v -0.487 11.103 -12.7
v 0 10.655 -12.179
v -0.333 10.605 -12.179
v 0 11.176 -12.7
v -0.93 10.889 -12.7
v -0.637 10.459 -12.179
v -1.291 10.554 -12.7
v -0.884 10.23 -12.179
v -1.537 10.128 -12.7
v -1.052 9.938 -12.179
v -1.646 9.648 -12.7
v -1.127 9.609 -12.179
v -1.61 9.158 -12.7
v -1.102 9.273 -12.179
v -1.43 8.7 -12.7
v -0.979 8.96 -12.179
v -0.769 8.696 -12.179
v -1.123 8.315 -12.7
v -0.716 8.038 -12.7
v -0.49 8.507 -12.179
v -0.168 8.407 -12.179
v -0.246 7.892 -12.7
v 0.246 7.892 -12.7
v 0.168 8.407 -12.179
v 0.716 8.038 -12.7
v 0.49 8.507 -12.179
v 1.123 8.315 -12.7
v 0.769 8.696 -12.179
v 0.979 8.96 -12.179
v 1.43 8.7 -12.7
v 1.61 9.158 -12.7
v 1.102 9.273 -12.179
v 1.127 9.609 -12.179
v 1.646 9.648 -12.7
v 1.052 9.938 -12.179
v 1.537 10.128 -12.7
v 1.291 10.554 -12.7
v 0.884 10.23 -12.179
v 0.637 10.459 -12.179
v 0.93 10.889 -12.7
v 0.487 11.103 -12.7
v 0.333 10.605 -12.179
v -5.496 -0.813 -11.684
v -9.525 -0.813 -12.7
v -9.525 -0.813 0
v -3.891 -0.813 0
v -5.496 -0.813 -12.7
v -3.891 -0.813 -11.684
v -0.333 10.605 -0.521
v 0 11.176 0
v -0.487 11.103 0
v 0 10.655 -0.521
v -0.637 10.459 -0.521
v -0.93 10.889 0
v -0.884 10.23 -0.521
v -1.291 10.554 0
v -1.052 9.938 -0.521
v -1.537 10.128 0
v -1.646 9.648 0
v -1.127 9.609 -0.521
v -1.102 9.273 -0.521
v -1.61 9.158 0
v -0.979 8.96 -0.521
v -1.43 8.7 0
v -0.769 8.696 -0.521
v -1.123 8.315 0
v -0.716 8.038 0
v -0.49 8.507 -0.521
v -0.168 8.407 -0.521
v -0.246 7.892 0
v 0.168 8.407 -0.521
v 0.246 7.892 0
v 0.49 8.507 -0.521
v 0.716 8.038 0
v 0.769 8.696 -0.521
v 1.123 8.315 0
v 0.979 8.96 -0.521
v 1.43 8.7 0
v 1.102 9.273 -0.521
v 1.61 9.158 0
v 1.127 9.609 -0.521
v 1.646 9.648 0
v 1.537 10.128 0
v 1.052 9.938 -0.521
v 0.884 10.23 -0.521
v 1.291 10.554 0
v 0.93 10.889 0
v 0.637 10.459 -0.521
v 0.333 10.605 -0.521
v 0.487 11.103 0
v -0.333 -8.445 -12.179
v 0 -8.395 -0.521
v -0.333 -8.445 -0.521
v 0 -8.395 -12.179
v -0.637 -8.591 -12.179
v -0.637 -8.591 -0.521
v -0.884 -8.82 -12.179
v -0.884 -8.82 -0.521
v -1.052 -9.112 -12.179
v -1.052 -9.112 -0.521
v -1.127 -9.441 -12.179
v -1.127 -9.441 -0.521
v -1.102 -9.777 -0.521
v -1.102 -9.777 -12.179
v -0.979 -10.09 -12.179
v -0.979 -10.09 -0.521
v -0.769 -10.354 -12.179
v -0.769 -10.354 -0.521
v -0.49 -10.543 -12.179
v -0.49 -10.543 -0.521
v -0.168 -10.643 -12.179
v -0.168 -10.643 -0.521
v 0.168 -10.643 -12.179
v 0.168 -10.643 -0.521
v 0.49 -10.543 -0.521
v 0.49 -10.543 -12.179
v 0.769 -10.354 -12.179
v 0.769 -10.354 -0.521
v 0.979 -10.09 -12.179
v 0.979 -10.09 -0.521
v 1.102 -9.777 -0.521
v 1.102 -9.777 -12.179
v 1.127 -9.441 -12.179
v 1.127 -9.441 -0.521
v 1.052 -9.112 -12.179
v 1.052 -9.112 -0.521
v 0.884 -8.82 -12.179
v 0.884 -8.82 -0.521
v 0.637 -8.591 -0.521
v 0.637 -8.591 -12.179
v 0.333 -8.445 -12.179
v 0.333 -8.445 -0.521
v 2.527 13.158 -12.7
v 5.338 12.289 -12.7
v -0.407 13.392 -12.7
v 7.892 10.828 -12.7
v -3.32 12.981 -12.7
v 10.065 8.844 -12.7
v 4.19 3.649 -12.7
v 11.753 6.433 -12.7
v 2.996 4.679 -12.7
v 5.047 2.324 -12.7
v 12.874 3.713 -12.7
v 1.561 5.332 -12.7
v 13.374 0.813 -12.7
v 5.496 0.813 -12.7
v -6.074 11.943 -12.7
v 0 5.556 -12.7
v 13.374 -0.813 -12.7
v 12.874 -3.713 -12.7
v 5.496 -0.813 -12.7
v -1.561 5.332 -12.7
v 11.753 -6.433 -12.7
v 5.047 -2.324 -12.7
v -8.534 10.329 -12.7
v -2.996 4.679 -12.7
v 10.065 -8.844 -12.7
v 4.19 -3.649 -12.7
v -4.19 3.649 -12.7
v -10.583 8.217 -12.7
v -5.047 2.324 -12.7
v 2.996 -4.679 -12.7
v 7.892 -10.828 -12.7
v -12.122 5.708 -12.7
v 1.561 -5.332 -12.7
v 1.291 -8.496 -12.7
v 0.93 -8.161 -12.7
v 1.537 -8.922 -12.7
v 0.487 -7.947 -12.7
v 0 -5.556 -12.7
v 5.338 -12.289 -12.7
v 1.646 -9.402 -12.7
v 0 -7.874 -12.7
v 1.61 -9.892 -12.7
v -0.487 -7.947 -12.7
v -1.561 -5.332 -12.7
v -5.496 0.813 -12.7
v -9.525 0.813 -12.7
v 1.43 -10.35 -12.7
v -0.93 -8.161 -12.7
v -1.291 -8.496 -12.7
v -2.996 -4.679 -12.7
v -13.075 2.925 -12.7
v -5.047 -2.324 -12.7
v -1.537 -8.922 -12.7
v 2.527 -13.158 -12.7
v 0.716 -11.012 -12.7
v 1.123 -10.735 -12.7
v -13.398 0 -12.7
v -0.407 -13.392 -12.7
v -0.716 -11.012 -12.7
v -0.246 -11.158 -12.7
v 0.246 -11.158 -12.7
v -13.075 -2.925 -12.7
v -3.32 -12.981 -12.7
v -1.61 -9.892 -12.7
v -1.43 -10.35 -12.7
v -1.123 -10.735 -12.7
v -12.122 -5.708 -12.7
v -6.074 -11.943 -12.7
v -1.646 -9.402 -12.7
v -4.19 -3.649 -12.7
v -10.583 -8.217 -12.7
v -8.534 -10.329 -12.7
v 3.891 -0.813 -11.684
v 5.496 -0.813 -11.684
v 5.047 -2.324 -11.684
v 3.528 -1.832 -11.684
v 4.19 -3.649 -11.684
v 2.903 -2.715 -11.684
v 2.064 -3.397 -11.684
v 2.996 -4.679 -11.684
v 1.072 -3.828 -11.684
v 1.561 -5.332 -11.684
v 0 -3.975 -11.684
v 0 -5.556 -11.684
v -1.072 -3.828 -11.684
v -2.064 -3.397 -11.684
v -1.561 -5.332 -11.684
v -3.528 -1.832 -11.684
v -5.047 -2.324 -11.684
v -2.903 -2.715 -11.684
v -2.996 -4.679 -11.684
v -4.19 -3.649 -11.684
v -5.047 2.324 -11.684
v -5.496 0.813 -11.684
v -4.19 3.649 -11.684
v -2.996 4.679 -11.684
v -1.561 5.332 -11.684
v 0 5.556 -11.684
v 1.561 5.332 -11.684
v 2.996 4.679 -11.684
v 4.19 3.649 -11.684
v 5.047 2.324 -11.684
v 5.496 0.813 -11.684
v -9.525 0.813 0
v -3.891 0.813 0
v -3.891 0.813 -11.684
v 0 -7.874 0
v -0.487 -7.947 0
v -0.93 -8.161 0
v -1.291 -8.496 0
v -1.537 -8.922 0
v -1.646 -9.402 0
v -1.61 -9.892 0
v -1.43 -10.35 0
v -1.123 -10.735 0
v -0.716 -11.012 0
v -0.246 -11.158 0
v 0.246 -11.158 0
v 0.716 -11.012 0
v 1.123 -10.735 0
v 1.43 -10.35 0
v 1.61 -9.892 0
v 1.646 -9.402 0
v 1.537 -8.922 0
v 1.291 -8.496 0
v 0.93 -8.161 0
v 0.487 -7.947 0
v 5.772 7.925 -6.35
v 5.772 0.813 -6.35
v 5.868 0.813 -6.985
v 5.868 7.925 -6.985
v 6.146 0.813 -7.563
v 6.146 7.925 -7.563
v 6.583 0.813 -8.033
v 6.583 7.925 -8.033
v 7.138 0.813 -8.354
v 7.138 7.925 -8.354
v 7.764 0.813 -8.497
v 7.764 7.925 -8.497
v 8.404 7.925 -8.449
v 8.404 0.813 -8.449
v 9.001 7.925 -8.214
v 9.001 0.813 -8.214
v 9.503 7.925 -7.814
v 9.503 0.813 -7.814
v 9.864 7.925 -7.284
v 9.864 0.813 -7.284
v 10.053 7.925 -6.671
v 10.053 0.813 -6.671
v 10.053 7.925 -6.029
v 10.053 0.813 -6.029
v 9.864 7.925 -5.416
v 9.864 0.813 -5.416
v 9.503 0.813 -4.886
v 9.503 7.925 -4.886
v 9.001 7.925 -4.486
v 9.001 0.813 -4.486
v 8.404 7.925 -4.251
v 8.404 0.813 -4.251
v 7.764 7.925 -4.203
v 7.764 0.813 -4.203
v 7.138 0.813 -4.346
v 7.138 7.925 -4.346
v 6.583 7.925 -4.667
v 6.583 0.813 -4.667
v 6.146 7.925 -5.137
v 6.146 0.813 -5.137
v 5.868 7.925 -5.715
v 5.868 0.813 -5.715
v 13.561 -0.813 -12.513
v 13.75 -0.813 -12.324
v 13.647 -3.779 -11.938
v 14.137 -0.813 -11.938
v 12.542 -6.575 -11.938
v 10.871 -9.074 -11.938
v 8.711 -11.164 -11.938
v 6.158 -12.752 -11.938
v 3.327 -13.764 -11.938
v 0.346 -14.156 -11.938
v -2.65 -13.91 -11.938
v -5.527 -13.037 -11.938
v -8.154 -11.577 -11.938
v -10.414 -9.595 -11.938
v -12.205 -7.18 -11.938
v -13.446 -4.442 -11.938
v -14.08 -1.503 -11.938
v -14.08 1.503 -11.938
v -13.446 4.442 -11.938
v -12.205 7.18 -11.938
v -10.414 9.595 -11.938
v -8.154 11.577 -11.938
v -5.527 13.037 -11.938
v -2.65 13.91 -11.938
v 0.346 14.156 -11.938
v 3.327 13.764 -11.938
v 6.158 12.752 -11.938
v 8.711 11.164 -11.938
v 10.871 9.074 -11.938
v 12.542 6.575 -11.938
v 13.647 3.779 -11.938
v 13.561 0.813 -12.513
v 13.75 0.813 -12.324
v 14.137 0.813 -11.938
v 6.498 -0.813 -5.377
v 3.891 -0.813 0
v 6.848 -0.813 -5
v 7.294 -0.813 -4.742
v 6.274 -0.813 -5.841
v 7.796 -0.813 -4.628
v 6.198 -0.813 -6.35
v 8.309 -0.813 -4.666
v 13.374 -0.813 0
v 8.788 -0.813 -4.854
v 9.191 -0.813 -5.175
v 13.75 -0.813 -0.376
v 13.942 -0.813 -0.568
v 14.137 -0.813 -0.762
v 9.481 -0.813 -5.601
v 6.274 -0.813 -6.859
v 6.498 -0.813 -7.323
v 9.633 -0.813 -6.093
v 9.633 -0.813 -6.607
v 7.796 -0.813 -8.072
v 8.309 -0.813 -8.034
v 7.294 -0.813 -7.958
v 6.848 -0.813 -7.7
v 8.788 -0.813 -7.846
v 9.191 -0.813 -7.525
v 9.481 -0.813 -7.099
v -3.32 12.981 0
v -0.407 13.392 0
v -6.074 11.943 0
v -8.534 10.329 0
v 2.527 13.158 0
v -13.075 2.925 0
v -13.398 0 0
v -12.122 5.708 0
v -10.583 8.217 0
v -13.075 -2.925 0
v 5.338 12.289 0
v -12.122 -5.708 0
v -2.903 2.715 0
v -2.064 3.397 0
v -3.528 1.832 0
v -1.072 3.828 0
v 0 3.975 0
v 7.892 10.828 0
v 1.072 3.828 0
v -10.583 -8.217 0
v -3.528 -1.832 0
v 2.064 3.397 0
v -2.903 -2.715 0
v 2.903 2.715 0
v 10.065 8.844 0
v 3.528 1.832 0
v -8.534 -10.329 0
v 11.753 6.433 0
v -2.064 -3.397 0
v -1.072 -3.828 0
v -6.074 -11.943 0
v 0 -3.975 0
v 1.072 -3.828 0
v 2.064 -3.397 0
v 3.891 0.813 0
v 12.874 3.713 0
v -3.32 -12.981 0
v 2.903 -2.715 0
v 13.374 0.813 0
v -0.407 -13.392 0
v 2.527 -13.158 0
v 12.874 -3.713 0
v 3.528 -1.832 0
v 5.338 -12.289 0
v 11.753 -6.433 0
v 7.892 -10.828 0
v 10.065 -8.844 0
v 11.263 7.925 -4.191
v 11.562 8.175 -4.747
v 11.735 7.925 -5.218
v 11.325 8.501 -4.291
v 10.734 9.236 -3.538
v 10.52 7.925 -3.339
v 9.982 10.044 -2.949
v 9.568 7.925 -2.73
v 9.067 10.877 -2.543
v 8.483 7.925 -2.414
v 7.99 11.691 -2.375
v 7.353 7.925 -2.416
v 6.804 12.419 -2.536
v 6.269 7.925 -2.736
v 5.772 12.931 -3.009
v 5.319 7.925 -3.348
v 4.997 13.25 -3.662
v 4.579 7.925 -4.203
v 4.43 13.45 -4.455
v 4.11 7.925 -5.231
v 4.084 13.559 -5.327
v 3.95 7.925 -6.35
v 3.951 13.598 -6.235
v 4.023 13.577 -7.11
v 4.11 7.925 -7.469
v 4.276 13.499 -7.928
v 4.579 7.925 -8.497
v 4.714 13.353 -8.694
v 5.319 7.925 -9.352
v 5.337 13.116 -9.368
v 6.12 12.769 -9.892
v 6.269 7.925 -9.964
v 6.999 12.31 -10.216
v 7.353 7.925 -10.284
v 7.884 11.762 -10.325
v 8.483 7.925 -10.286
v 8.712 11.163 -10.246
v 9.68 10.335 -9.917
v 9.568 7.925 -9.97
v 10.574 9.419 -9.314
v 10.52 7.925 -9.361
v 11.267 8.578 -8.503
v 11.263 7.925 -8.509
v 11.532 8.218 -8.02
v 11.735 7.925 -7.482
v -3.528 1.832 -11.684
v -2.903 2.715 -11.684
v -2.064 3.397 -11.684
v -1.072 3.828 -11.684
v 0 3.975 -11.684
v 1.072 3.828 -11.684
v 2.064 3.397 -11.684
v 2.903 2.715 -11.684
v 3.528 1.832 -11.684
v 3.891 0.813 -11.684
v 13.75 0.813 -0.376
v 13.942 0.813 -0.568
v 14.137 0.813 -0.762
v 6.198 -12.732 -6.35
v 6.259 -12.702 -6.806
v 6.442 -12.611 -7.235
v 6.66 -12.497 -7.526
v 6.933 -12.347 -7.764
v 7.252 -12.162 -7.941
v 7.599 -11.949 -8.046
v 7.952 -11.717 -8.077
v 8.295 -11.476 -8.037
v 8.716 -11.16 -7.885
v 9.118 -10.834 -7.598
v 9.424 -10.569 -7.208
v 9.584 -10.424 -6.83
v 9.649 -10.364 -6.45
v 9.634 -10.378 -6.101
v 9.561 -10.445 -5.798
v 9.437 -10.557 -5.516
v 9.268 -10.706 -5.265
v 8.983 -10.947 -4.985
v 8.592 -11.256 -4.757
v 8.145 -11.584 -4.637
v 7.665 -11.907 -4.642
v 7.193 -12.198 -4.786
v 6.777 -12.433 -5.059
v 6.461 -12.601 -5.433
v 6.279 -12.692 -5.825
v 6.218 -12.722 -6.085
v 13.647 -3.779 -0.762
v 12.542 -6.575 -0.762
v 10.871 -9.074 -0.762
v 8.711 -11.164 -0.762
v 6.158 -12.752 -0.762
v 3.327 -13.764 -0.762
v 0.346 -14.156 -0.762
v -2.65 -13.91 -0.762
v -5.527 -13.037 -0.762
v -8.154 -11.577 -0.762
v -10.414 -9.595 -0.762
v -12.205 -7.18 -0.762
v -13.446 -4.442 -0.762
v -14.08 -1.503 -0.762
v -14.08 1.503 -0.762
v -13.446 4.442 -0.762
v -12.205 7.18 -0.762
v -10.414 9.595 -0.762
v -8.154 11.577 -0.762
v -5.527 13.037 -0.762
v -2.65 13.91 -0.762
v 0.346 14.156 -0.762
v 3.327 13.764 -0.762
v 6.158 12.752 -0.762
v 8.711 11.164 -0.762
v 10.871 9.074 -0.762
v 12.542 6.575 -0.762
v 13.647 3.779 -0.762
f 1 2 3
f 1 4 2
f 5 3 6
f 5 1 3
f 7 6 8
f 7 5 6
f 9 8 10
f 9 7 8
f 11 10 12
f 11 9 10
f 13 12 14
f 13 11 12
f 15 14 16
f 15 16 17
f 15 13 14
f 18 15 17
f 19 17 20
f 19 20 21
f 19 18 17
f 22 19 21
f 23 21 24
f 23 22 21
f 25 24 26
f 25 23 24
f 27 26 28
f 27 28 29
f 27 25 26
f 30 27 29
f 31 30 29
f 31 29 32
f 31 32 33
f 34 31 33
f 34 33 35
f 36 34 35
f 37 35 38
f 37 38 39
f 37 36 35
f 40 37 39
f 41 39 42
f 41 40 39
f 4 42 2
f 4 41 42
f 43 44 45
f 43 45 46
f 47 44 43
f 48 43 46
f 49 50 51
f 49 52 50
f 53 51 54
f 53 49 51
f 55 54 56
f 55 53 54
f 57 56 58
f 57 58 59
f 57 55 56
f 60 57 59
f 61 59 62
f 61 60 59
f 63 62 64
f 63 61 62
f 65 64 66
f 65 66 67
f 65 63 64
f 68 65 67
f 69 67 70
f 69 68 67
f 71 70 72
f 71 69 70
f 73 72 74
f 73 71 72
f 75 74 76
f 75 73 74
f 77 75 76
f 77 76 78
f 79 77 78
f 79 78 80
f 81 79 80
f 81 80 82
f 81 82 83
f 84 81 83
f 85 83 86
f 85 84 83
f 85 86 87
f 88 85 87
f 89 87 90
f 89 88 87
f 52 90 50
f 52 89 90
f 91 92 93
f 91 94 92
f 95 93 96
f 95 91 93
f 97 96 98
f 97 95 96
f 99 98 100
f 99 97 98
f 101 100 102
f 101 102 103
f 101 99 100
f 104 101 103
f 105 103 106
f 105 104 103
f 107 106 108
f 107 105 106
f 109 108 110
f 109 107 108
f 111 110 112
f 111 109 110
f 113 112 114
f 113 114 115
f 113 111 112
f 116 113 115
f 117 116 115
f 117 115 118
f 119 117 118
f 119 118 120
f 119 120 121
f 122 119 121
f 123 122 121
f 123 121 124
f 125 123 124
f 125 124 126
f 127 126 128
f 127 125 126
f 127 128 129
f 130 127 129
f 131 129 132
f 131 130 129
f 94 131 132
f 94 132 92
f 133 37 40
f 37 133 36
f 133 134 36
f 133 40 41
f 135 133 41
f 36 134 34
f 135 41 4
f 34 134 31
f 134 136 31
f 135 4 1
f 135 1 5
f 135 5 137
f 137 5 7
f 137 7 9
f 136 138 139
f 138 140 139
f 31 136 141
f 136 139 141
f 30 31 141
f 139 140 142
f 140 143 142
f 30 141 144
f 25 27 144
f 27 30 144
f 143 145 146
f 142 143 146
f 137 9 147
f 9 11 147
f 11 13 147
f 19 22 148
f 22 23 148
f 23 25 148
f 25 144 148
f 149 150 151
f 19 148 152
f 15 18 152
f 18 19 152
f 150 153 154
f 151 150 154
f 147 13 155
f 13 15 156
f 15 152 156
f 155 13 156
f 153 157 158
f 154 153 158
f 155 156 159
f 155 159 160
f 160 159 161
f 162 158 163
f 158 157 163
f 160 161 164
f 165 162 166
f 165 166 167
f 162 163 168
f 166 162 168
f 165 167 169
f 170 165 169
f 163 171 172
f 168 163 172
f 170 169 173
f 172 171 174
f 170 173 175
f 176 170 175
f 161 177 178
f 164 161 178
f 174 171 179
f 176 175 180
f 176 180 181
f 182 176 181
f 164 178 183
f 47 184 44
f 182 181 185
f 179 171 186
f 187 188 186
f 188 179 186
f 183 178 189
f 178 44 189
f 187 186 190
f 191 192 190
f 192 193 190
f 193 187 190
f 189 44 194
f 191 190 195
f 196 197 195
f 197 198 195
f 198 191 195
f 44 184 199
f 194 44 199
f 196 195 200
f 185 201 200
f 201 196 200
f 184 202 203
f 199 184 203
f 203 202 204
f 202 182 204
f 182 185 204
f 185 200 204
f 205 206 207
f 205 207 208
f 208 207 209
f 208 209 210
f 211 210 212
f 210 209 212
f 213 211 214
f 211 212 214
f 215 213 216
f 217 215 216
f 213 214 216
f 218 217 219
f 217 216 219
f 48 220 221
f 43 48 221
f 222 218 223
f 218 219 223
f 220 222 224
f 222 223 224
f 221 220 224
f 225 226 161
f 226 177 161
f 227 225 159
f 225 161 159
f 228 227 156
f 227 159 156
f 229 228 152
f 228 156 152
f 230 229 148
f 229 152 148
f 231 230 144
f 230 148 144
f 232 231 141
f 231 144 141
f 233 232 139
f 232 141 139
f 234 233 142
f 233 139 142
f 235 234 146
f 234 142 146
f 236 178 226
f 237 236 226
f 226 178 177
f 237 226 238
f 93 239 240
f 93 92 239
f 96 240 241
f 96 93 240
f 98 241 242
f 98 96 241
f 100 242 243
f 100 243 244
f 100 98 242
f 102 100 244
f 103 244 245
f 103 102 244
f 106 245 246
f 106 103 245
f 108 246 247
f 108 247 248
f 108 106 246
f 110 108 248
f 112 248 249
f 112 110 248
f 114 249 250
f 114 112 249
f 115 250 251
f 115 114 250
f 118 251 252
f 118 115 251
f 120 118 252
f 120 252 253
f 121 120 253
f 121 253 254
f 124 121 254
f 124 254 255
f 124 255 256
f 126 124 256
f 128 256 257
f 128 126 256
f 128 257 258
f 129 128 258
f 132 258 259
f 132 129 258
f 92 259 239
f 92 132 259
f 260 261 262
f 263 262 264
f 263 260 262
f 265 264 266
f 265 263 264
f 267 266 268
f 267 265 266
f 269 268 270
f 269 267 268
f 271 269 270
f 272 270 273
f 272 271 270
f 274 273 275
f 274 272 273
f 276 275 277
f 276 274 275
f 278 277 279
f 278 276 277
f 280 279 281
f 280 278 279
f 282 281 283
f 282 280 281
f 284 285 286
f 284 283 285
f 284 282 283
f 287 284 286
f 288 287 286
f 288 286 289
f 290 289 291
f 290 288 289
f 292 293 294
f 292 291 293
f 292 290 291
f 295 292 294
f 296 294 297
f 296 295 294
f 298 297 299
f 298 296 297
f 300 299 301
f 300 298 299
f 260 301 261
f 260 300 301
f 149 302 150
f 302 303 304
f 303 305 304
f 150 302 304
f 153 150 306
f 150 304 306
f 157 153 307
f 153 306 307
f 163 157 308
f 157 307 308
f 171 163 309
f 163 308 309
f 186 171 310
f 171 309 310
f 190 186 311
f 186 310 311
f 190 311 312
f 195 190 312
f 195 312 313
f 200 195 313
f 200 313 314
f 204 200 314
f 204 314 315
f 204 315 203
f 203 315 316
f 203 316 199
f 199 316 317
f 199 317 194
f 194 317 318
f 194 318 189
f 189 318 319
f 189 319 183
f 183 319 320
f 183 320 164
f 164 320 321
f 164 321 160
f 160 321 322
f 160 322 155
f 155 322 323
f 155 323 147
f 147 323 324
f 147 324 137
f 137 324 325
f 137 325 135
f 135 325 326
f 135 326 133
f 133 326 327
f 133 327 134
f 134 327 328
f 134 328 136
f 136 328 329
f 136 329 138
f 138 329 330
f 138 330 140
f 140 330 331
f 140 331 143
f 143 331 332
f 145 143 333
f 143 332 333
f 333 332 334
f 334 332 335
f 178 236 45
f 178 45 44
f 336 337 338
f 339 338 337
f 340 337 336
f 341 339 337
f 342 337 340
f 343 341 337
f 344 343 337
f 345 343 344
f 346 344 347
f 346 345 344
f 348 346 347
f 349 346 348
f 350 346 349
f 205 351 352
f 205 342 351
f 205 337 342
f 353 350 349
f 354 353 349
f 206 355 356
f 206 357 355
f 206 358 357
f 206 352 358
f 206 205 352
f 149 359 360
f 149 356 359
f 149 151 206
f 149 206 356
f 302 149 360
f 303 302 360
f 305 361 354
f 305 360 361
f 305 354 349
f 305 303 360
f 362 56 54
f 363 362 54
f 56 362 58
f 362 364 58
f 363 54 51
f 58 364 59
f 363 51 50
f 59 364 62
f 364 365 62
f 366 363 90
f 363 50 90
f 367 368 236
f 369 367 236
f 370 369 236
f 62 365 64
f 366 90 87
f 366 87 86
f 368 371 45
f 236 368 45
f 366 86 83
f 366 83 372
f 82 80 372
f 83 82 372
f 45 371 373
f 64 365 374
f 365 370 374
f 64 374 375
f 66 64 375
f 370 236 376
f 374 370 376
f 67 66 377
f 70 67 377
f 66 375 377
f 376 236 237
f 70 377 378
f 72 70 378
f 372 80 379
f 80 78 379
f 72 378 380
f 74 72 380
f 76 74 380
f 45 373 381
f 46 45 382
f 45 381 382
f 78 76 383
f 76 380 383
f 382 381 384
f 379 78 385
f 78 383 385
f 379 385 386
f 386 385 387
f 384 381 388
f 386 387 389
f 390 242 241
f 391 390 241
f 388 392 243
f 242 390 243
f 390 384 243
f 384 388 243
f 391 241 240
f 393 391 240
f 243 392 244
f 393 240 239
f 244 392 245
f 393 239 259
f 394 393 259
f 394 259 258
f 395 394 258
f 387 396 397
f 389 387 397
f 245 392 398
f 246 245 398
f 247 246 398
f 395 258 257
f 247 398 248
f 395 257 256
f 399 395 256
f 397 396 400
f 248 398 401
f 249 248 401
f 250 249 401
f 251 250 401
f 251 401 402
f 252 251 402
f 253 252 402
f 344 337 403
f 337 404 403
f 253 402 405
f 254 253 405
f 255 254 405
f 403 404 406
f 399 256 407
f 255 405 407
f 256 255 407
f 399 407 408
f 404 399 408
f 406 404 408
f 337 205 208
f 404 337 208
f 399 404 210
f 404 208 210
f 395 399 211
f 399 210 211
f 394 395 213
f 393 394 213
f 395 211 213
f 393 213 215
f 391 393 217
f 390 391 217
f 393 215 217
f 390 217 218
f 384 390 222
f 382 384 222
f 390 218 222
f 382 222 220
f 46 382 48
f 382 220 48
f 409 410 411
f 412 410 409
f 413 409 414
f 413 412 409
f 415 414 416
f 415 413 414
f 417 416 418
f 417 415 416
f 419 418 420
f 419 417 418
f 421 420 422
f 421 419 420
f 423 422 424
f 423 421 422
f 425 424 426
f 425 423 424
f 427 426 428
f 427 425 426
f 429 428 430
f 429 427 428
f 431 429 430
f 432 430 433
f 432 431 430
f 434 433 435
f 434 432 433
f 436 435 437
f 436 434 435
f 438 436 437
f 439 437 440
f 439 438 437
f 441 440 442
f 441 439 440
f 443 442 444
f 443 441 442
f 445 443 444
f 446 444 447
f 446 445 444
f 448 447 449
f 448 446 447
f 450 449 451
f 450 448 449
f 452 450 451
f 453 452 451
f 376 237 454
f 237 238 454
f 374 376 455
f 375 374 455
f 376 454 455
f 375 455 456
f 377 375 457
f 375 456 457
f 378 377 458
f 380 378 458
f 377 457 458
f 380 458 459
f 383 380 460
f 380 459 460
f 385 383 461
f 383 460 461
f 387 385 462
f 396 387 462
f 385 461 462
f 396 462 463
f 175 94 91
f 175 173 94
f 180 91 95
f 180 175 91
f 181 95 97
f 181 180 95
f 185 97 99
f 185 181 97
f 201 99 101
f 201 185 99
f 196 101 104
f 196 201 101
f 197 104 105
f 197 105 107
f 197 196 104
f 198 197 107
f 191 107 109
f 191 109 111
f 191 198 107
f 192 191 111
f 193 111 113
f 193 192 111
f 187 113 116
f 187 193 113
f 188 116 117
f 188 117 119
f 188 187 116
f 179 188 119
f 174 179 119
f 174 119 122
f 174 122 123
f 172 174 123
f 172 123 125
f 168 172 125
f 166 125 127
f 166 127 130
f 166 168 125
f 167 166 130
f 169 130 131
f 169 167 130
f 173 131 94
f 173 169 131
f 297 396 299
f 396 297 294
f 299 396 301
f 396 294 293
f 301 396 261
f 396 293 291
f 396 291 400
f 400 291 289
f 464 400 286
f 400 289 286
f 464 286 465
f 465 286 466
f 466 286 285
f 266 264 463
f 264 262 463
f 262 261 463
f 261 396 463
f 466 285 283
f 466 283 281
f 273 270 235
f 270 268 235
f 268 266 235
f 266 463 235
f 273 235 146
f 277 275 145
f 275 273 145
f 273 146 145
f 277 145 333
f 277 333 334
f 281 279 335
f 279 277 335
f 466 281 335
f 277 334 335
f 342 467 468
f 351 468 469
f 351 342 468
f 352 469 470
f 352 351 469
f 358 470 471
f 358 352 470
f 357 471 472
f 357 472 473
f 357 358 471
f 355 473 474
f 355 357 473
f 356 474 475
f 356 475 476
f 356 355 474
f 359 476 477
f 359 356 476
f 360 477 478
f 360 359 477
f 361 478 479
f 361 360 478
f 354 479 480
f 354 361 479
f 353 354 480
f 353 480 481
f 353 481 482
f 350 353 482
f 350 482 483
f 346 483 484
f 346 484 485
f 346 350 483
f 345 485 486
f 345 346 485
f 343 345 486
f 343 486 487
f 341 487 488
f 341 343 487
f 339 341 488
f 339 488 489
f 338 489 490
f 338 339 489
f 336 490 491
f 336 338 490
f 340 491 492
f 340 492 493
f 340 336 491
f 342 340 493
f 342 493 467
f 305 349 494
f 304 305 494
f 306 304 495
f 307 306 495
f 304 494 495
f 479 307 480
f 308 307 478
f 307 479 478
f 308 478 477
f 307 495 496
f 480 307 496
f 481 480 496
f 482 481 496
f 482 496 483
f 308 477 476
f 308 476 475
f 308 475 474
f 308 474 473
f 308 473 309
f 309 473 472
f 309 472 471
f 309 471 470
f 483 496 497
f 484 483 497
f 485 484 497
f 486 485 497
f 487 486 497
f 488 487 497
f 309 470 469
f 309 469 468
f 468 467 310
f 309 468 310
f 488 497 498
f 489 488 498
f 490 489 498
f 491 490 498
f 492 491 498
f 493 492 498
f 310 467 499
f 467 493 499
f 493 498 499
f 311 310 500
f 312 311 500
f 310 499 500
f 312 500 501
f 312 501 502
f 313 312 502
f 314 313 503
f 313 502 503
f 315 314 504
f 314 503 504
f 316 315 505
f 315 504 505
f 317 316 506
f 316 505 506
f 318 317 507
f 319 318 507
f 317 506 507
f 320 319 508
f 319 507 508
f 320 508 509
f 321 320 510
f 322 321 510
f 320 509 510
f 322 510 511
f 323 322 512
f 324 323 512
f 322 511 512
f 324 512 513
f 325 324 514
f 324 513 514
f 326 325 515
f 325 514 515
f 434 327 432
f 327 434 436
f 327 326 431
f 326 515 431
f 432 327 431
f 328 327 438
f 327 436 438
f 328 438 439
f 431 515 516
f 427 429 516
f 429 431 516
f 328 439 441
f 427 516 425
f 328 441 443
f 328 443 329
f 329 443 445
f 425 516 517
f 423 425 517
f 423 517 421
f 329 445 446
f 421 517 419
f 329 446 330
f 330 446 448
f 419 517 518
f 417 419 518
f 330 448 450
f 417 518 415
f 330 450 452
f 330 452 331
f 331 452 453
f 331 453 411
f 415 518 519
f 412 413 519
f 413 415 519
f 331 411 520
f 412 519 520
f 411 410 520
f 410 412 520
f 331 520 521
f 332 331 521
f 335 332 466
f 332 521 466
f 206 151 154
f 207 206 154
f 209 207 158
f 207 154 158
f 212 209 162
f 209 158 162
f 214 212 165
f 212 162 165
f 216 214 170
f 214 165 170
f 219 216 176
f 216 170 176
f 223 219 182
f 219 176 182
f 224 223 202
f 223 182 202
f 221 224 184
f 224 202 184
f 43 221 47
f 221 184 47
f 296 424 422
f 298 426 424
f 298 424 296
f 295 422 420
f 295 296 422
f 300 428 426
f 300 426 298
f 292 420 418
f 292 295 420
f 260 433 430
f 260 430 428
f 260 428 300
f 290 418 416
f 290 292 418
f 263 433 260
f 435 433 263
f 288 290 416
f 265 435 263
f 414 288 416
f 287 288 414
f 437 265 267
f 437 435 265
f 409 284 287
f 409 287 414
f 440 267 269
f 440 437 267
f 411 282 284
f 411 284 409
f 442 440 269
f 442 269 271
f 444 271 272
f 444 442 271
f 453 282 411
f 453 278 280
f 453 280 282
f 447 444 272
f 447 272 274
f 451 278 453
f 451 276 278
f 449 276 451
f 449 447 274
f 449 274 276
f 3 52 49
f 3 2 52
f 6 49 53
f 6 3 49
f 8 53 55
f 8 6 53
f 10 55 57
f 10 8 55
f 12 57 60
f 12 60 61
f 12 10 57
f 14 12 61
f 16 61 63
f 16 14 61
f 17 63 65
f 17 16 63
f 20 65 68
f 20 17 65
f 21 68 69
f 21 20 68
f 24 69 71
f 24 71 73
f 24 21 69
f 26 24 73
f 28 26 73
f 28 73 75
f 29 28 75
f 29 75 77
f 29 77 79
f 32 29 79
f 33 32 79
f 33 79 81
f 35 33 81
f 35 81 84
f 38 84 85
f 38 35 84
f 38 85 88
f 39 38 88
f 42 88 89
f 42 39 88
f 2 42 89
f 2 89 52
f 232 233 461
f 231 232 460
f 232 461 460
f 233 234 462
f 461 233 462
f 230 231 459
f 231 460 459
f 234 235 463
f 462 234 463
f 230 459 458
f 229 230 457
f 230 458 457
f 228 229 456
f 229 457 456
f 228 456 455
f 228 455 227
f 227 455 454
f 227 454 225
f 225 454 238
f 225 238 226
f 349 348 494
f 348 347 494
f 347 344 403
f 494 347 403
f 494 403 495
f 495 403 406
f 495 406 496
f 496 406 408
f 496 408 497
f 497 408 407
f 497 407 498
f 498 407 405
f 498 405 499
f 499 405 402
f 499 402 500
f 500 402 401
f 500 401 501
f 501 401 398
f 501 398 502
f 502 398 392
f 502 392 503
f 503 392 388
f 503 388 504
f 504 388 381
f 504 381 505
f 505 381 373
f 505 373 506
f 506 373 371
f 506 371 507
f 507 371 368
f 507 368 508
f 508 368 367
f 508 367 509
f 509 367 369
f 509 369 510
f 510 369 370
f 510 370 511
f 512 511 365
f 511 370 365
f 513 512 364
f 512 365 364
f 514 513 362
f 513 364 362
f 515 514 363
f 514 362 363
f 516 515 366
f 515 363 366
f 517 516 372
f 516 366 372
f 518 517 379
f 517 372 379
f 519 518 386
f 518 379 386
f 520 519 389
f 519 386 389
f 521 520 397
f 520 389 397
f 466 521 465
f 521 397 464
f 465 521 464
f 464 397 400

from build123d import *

# Parameters (mm, degrees)
CHAMFER1_SIZE                  = 0.762
F_4_40_TAPPED_HOLE1_AT_2_COUNT = 2
F_4_40_TAPPED_HOLE1_AT_2_PITCH = 19.05
SKETCH4_W                      = 34.925
SKETCH4_H                      = 42.395859198
CUT_EXTRUDE1_DEPTH             = 0.8128


with BuildPart() as part:
    # Sketch1 → Revolve1 (revolve)
    with BuildSketch(Plane(origin=(0, 0, 0), x_dir=(0, 0, -1), z_dir=(1, 0, 0))):
        Polygon((0, 3.9751), (11.684, 3.9751), (11.684, 5.55625), (12.7, 5.55625), (12.7, 14.1605), (0, 14.1605), align=None)
    revolve(axis=Axis((0, 0, -16.392907801), (0, 0, -1)))

    # Chamfer1
    chamfer1_edges = [part.edges().sort_by_distance(p)[0] for p in [
        (0, -14.1605, -12.7),
        (0, -14.1605, 0),
    ]]
    chamfer(chamfer1_edges, length=CHAMFER1_SIZE)

    # Sketch2 → Cut-Revolve1 (revolve, cut)
    with BuildSketch(Plane.XY.offset(-6.35)):
        Polygon((10.07745, 0), (10.07745, 7.9248), (11.8999, 7.9248), (11.8999, 20.6248), (7.9248, 20.6248), (7.9248, -19.869024768), (9.652, -18.871825383), (9.652, -0.245633672), align=None)
    revolve(axis=Axis((7.9248, -19.869024768, -6.35), (0, -1, 0)), mode=Mode.SUBTRACT)

    # Sketch5 → #4-40 Tapped Hole1 (revolve, cut)
    with BuildSketch(Plane(origin=(0, 9.525, -12.7), x_dir=(0, 1, 0), z_dir=(1, 0, 0))):
        Polygon((0, 0), (0, 12.7), (1.651, 12.7), (1.1303, 12.1793), (1.1303, 0.5207), (1.651, 0), align=None)
    f_4_40_tapped_hole1 = revolve(axis=Axis((0, 9.525, -19.05), (0, 0, 1)), mode=Mode.SUBTRACT)

    # #4-40 Tapped Hole1 at 2: #4-40 Tapped Hole1 ×2
    with Locations(*[(0, -i * F_4_40_TAPPED_HOLE1_AT_2_PITCH, 0) for i in range(1, F_4_40_TAPPED_HOLE1_AT_2_COUNT)]):
        add(f_4_40_tapped_hole1, mode=Mode.SUBTRACT)

    # Sketch4 → Cut-Extrude1 (cut, symmetric)
    with BuildSketch(Plane(origin=(0, 0, 0), x_dir=(1, 0, 0), z_dir=(0, 1, 0))):
        with Locations((7.9375, 14.389486552)):
            Rectangle(SKETCH4_W, SKETCH4_H)
    extrude(amount=CUT_EXTRUDE1_DEPTH, both=True, mode=Mode.SUBTRACT)


solid = part.part
